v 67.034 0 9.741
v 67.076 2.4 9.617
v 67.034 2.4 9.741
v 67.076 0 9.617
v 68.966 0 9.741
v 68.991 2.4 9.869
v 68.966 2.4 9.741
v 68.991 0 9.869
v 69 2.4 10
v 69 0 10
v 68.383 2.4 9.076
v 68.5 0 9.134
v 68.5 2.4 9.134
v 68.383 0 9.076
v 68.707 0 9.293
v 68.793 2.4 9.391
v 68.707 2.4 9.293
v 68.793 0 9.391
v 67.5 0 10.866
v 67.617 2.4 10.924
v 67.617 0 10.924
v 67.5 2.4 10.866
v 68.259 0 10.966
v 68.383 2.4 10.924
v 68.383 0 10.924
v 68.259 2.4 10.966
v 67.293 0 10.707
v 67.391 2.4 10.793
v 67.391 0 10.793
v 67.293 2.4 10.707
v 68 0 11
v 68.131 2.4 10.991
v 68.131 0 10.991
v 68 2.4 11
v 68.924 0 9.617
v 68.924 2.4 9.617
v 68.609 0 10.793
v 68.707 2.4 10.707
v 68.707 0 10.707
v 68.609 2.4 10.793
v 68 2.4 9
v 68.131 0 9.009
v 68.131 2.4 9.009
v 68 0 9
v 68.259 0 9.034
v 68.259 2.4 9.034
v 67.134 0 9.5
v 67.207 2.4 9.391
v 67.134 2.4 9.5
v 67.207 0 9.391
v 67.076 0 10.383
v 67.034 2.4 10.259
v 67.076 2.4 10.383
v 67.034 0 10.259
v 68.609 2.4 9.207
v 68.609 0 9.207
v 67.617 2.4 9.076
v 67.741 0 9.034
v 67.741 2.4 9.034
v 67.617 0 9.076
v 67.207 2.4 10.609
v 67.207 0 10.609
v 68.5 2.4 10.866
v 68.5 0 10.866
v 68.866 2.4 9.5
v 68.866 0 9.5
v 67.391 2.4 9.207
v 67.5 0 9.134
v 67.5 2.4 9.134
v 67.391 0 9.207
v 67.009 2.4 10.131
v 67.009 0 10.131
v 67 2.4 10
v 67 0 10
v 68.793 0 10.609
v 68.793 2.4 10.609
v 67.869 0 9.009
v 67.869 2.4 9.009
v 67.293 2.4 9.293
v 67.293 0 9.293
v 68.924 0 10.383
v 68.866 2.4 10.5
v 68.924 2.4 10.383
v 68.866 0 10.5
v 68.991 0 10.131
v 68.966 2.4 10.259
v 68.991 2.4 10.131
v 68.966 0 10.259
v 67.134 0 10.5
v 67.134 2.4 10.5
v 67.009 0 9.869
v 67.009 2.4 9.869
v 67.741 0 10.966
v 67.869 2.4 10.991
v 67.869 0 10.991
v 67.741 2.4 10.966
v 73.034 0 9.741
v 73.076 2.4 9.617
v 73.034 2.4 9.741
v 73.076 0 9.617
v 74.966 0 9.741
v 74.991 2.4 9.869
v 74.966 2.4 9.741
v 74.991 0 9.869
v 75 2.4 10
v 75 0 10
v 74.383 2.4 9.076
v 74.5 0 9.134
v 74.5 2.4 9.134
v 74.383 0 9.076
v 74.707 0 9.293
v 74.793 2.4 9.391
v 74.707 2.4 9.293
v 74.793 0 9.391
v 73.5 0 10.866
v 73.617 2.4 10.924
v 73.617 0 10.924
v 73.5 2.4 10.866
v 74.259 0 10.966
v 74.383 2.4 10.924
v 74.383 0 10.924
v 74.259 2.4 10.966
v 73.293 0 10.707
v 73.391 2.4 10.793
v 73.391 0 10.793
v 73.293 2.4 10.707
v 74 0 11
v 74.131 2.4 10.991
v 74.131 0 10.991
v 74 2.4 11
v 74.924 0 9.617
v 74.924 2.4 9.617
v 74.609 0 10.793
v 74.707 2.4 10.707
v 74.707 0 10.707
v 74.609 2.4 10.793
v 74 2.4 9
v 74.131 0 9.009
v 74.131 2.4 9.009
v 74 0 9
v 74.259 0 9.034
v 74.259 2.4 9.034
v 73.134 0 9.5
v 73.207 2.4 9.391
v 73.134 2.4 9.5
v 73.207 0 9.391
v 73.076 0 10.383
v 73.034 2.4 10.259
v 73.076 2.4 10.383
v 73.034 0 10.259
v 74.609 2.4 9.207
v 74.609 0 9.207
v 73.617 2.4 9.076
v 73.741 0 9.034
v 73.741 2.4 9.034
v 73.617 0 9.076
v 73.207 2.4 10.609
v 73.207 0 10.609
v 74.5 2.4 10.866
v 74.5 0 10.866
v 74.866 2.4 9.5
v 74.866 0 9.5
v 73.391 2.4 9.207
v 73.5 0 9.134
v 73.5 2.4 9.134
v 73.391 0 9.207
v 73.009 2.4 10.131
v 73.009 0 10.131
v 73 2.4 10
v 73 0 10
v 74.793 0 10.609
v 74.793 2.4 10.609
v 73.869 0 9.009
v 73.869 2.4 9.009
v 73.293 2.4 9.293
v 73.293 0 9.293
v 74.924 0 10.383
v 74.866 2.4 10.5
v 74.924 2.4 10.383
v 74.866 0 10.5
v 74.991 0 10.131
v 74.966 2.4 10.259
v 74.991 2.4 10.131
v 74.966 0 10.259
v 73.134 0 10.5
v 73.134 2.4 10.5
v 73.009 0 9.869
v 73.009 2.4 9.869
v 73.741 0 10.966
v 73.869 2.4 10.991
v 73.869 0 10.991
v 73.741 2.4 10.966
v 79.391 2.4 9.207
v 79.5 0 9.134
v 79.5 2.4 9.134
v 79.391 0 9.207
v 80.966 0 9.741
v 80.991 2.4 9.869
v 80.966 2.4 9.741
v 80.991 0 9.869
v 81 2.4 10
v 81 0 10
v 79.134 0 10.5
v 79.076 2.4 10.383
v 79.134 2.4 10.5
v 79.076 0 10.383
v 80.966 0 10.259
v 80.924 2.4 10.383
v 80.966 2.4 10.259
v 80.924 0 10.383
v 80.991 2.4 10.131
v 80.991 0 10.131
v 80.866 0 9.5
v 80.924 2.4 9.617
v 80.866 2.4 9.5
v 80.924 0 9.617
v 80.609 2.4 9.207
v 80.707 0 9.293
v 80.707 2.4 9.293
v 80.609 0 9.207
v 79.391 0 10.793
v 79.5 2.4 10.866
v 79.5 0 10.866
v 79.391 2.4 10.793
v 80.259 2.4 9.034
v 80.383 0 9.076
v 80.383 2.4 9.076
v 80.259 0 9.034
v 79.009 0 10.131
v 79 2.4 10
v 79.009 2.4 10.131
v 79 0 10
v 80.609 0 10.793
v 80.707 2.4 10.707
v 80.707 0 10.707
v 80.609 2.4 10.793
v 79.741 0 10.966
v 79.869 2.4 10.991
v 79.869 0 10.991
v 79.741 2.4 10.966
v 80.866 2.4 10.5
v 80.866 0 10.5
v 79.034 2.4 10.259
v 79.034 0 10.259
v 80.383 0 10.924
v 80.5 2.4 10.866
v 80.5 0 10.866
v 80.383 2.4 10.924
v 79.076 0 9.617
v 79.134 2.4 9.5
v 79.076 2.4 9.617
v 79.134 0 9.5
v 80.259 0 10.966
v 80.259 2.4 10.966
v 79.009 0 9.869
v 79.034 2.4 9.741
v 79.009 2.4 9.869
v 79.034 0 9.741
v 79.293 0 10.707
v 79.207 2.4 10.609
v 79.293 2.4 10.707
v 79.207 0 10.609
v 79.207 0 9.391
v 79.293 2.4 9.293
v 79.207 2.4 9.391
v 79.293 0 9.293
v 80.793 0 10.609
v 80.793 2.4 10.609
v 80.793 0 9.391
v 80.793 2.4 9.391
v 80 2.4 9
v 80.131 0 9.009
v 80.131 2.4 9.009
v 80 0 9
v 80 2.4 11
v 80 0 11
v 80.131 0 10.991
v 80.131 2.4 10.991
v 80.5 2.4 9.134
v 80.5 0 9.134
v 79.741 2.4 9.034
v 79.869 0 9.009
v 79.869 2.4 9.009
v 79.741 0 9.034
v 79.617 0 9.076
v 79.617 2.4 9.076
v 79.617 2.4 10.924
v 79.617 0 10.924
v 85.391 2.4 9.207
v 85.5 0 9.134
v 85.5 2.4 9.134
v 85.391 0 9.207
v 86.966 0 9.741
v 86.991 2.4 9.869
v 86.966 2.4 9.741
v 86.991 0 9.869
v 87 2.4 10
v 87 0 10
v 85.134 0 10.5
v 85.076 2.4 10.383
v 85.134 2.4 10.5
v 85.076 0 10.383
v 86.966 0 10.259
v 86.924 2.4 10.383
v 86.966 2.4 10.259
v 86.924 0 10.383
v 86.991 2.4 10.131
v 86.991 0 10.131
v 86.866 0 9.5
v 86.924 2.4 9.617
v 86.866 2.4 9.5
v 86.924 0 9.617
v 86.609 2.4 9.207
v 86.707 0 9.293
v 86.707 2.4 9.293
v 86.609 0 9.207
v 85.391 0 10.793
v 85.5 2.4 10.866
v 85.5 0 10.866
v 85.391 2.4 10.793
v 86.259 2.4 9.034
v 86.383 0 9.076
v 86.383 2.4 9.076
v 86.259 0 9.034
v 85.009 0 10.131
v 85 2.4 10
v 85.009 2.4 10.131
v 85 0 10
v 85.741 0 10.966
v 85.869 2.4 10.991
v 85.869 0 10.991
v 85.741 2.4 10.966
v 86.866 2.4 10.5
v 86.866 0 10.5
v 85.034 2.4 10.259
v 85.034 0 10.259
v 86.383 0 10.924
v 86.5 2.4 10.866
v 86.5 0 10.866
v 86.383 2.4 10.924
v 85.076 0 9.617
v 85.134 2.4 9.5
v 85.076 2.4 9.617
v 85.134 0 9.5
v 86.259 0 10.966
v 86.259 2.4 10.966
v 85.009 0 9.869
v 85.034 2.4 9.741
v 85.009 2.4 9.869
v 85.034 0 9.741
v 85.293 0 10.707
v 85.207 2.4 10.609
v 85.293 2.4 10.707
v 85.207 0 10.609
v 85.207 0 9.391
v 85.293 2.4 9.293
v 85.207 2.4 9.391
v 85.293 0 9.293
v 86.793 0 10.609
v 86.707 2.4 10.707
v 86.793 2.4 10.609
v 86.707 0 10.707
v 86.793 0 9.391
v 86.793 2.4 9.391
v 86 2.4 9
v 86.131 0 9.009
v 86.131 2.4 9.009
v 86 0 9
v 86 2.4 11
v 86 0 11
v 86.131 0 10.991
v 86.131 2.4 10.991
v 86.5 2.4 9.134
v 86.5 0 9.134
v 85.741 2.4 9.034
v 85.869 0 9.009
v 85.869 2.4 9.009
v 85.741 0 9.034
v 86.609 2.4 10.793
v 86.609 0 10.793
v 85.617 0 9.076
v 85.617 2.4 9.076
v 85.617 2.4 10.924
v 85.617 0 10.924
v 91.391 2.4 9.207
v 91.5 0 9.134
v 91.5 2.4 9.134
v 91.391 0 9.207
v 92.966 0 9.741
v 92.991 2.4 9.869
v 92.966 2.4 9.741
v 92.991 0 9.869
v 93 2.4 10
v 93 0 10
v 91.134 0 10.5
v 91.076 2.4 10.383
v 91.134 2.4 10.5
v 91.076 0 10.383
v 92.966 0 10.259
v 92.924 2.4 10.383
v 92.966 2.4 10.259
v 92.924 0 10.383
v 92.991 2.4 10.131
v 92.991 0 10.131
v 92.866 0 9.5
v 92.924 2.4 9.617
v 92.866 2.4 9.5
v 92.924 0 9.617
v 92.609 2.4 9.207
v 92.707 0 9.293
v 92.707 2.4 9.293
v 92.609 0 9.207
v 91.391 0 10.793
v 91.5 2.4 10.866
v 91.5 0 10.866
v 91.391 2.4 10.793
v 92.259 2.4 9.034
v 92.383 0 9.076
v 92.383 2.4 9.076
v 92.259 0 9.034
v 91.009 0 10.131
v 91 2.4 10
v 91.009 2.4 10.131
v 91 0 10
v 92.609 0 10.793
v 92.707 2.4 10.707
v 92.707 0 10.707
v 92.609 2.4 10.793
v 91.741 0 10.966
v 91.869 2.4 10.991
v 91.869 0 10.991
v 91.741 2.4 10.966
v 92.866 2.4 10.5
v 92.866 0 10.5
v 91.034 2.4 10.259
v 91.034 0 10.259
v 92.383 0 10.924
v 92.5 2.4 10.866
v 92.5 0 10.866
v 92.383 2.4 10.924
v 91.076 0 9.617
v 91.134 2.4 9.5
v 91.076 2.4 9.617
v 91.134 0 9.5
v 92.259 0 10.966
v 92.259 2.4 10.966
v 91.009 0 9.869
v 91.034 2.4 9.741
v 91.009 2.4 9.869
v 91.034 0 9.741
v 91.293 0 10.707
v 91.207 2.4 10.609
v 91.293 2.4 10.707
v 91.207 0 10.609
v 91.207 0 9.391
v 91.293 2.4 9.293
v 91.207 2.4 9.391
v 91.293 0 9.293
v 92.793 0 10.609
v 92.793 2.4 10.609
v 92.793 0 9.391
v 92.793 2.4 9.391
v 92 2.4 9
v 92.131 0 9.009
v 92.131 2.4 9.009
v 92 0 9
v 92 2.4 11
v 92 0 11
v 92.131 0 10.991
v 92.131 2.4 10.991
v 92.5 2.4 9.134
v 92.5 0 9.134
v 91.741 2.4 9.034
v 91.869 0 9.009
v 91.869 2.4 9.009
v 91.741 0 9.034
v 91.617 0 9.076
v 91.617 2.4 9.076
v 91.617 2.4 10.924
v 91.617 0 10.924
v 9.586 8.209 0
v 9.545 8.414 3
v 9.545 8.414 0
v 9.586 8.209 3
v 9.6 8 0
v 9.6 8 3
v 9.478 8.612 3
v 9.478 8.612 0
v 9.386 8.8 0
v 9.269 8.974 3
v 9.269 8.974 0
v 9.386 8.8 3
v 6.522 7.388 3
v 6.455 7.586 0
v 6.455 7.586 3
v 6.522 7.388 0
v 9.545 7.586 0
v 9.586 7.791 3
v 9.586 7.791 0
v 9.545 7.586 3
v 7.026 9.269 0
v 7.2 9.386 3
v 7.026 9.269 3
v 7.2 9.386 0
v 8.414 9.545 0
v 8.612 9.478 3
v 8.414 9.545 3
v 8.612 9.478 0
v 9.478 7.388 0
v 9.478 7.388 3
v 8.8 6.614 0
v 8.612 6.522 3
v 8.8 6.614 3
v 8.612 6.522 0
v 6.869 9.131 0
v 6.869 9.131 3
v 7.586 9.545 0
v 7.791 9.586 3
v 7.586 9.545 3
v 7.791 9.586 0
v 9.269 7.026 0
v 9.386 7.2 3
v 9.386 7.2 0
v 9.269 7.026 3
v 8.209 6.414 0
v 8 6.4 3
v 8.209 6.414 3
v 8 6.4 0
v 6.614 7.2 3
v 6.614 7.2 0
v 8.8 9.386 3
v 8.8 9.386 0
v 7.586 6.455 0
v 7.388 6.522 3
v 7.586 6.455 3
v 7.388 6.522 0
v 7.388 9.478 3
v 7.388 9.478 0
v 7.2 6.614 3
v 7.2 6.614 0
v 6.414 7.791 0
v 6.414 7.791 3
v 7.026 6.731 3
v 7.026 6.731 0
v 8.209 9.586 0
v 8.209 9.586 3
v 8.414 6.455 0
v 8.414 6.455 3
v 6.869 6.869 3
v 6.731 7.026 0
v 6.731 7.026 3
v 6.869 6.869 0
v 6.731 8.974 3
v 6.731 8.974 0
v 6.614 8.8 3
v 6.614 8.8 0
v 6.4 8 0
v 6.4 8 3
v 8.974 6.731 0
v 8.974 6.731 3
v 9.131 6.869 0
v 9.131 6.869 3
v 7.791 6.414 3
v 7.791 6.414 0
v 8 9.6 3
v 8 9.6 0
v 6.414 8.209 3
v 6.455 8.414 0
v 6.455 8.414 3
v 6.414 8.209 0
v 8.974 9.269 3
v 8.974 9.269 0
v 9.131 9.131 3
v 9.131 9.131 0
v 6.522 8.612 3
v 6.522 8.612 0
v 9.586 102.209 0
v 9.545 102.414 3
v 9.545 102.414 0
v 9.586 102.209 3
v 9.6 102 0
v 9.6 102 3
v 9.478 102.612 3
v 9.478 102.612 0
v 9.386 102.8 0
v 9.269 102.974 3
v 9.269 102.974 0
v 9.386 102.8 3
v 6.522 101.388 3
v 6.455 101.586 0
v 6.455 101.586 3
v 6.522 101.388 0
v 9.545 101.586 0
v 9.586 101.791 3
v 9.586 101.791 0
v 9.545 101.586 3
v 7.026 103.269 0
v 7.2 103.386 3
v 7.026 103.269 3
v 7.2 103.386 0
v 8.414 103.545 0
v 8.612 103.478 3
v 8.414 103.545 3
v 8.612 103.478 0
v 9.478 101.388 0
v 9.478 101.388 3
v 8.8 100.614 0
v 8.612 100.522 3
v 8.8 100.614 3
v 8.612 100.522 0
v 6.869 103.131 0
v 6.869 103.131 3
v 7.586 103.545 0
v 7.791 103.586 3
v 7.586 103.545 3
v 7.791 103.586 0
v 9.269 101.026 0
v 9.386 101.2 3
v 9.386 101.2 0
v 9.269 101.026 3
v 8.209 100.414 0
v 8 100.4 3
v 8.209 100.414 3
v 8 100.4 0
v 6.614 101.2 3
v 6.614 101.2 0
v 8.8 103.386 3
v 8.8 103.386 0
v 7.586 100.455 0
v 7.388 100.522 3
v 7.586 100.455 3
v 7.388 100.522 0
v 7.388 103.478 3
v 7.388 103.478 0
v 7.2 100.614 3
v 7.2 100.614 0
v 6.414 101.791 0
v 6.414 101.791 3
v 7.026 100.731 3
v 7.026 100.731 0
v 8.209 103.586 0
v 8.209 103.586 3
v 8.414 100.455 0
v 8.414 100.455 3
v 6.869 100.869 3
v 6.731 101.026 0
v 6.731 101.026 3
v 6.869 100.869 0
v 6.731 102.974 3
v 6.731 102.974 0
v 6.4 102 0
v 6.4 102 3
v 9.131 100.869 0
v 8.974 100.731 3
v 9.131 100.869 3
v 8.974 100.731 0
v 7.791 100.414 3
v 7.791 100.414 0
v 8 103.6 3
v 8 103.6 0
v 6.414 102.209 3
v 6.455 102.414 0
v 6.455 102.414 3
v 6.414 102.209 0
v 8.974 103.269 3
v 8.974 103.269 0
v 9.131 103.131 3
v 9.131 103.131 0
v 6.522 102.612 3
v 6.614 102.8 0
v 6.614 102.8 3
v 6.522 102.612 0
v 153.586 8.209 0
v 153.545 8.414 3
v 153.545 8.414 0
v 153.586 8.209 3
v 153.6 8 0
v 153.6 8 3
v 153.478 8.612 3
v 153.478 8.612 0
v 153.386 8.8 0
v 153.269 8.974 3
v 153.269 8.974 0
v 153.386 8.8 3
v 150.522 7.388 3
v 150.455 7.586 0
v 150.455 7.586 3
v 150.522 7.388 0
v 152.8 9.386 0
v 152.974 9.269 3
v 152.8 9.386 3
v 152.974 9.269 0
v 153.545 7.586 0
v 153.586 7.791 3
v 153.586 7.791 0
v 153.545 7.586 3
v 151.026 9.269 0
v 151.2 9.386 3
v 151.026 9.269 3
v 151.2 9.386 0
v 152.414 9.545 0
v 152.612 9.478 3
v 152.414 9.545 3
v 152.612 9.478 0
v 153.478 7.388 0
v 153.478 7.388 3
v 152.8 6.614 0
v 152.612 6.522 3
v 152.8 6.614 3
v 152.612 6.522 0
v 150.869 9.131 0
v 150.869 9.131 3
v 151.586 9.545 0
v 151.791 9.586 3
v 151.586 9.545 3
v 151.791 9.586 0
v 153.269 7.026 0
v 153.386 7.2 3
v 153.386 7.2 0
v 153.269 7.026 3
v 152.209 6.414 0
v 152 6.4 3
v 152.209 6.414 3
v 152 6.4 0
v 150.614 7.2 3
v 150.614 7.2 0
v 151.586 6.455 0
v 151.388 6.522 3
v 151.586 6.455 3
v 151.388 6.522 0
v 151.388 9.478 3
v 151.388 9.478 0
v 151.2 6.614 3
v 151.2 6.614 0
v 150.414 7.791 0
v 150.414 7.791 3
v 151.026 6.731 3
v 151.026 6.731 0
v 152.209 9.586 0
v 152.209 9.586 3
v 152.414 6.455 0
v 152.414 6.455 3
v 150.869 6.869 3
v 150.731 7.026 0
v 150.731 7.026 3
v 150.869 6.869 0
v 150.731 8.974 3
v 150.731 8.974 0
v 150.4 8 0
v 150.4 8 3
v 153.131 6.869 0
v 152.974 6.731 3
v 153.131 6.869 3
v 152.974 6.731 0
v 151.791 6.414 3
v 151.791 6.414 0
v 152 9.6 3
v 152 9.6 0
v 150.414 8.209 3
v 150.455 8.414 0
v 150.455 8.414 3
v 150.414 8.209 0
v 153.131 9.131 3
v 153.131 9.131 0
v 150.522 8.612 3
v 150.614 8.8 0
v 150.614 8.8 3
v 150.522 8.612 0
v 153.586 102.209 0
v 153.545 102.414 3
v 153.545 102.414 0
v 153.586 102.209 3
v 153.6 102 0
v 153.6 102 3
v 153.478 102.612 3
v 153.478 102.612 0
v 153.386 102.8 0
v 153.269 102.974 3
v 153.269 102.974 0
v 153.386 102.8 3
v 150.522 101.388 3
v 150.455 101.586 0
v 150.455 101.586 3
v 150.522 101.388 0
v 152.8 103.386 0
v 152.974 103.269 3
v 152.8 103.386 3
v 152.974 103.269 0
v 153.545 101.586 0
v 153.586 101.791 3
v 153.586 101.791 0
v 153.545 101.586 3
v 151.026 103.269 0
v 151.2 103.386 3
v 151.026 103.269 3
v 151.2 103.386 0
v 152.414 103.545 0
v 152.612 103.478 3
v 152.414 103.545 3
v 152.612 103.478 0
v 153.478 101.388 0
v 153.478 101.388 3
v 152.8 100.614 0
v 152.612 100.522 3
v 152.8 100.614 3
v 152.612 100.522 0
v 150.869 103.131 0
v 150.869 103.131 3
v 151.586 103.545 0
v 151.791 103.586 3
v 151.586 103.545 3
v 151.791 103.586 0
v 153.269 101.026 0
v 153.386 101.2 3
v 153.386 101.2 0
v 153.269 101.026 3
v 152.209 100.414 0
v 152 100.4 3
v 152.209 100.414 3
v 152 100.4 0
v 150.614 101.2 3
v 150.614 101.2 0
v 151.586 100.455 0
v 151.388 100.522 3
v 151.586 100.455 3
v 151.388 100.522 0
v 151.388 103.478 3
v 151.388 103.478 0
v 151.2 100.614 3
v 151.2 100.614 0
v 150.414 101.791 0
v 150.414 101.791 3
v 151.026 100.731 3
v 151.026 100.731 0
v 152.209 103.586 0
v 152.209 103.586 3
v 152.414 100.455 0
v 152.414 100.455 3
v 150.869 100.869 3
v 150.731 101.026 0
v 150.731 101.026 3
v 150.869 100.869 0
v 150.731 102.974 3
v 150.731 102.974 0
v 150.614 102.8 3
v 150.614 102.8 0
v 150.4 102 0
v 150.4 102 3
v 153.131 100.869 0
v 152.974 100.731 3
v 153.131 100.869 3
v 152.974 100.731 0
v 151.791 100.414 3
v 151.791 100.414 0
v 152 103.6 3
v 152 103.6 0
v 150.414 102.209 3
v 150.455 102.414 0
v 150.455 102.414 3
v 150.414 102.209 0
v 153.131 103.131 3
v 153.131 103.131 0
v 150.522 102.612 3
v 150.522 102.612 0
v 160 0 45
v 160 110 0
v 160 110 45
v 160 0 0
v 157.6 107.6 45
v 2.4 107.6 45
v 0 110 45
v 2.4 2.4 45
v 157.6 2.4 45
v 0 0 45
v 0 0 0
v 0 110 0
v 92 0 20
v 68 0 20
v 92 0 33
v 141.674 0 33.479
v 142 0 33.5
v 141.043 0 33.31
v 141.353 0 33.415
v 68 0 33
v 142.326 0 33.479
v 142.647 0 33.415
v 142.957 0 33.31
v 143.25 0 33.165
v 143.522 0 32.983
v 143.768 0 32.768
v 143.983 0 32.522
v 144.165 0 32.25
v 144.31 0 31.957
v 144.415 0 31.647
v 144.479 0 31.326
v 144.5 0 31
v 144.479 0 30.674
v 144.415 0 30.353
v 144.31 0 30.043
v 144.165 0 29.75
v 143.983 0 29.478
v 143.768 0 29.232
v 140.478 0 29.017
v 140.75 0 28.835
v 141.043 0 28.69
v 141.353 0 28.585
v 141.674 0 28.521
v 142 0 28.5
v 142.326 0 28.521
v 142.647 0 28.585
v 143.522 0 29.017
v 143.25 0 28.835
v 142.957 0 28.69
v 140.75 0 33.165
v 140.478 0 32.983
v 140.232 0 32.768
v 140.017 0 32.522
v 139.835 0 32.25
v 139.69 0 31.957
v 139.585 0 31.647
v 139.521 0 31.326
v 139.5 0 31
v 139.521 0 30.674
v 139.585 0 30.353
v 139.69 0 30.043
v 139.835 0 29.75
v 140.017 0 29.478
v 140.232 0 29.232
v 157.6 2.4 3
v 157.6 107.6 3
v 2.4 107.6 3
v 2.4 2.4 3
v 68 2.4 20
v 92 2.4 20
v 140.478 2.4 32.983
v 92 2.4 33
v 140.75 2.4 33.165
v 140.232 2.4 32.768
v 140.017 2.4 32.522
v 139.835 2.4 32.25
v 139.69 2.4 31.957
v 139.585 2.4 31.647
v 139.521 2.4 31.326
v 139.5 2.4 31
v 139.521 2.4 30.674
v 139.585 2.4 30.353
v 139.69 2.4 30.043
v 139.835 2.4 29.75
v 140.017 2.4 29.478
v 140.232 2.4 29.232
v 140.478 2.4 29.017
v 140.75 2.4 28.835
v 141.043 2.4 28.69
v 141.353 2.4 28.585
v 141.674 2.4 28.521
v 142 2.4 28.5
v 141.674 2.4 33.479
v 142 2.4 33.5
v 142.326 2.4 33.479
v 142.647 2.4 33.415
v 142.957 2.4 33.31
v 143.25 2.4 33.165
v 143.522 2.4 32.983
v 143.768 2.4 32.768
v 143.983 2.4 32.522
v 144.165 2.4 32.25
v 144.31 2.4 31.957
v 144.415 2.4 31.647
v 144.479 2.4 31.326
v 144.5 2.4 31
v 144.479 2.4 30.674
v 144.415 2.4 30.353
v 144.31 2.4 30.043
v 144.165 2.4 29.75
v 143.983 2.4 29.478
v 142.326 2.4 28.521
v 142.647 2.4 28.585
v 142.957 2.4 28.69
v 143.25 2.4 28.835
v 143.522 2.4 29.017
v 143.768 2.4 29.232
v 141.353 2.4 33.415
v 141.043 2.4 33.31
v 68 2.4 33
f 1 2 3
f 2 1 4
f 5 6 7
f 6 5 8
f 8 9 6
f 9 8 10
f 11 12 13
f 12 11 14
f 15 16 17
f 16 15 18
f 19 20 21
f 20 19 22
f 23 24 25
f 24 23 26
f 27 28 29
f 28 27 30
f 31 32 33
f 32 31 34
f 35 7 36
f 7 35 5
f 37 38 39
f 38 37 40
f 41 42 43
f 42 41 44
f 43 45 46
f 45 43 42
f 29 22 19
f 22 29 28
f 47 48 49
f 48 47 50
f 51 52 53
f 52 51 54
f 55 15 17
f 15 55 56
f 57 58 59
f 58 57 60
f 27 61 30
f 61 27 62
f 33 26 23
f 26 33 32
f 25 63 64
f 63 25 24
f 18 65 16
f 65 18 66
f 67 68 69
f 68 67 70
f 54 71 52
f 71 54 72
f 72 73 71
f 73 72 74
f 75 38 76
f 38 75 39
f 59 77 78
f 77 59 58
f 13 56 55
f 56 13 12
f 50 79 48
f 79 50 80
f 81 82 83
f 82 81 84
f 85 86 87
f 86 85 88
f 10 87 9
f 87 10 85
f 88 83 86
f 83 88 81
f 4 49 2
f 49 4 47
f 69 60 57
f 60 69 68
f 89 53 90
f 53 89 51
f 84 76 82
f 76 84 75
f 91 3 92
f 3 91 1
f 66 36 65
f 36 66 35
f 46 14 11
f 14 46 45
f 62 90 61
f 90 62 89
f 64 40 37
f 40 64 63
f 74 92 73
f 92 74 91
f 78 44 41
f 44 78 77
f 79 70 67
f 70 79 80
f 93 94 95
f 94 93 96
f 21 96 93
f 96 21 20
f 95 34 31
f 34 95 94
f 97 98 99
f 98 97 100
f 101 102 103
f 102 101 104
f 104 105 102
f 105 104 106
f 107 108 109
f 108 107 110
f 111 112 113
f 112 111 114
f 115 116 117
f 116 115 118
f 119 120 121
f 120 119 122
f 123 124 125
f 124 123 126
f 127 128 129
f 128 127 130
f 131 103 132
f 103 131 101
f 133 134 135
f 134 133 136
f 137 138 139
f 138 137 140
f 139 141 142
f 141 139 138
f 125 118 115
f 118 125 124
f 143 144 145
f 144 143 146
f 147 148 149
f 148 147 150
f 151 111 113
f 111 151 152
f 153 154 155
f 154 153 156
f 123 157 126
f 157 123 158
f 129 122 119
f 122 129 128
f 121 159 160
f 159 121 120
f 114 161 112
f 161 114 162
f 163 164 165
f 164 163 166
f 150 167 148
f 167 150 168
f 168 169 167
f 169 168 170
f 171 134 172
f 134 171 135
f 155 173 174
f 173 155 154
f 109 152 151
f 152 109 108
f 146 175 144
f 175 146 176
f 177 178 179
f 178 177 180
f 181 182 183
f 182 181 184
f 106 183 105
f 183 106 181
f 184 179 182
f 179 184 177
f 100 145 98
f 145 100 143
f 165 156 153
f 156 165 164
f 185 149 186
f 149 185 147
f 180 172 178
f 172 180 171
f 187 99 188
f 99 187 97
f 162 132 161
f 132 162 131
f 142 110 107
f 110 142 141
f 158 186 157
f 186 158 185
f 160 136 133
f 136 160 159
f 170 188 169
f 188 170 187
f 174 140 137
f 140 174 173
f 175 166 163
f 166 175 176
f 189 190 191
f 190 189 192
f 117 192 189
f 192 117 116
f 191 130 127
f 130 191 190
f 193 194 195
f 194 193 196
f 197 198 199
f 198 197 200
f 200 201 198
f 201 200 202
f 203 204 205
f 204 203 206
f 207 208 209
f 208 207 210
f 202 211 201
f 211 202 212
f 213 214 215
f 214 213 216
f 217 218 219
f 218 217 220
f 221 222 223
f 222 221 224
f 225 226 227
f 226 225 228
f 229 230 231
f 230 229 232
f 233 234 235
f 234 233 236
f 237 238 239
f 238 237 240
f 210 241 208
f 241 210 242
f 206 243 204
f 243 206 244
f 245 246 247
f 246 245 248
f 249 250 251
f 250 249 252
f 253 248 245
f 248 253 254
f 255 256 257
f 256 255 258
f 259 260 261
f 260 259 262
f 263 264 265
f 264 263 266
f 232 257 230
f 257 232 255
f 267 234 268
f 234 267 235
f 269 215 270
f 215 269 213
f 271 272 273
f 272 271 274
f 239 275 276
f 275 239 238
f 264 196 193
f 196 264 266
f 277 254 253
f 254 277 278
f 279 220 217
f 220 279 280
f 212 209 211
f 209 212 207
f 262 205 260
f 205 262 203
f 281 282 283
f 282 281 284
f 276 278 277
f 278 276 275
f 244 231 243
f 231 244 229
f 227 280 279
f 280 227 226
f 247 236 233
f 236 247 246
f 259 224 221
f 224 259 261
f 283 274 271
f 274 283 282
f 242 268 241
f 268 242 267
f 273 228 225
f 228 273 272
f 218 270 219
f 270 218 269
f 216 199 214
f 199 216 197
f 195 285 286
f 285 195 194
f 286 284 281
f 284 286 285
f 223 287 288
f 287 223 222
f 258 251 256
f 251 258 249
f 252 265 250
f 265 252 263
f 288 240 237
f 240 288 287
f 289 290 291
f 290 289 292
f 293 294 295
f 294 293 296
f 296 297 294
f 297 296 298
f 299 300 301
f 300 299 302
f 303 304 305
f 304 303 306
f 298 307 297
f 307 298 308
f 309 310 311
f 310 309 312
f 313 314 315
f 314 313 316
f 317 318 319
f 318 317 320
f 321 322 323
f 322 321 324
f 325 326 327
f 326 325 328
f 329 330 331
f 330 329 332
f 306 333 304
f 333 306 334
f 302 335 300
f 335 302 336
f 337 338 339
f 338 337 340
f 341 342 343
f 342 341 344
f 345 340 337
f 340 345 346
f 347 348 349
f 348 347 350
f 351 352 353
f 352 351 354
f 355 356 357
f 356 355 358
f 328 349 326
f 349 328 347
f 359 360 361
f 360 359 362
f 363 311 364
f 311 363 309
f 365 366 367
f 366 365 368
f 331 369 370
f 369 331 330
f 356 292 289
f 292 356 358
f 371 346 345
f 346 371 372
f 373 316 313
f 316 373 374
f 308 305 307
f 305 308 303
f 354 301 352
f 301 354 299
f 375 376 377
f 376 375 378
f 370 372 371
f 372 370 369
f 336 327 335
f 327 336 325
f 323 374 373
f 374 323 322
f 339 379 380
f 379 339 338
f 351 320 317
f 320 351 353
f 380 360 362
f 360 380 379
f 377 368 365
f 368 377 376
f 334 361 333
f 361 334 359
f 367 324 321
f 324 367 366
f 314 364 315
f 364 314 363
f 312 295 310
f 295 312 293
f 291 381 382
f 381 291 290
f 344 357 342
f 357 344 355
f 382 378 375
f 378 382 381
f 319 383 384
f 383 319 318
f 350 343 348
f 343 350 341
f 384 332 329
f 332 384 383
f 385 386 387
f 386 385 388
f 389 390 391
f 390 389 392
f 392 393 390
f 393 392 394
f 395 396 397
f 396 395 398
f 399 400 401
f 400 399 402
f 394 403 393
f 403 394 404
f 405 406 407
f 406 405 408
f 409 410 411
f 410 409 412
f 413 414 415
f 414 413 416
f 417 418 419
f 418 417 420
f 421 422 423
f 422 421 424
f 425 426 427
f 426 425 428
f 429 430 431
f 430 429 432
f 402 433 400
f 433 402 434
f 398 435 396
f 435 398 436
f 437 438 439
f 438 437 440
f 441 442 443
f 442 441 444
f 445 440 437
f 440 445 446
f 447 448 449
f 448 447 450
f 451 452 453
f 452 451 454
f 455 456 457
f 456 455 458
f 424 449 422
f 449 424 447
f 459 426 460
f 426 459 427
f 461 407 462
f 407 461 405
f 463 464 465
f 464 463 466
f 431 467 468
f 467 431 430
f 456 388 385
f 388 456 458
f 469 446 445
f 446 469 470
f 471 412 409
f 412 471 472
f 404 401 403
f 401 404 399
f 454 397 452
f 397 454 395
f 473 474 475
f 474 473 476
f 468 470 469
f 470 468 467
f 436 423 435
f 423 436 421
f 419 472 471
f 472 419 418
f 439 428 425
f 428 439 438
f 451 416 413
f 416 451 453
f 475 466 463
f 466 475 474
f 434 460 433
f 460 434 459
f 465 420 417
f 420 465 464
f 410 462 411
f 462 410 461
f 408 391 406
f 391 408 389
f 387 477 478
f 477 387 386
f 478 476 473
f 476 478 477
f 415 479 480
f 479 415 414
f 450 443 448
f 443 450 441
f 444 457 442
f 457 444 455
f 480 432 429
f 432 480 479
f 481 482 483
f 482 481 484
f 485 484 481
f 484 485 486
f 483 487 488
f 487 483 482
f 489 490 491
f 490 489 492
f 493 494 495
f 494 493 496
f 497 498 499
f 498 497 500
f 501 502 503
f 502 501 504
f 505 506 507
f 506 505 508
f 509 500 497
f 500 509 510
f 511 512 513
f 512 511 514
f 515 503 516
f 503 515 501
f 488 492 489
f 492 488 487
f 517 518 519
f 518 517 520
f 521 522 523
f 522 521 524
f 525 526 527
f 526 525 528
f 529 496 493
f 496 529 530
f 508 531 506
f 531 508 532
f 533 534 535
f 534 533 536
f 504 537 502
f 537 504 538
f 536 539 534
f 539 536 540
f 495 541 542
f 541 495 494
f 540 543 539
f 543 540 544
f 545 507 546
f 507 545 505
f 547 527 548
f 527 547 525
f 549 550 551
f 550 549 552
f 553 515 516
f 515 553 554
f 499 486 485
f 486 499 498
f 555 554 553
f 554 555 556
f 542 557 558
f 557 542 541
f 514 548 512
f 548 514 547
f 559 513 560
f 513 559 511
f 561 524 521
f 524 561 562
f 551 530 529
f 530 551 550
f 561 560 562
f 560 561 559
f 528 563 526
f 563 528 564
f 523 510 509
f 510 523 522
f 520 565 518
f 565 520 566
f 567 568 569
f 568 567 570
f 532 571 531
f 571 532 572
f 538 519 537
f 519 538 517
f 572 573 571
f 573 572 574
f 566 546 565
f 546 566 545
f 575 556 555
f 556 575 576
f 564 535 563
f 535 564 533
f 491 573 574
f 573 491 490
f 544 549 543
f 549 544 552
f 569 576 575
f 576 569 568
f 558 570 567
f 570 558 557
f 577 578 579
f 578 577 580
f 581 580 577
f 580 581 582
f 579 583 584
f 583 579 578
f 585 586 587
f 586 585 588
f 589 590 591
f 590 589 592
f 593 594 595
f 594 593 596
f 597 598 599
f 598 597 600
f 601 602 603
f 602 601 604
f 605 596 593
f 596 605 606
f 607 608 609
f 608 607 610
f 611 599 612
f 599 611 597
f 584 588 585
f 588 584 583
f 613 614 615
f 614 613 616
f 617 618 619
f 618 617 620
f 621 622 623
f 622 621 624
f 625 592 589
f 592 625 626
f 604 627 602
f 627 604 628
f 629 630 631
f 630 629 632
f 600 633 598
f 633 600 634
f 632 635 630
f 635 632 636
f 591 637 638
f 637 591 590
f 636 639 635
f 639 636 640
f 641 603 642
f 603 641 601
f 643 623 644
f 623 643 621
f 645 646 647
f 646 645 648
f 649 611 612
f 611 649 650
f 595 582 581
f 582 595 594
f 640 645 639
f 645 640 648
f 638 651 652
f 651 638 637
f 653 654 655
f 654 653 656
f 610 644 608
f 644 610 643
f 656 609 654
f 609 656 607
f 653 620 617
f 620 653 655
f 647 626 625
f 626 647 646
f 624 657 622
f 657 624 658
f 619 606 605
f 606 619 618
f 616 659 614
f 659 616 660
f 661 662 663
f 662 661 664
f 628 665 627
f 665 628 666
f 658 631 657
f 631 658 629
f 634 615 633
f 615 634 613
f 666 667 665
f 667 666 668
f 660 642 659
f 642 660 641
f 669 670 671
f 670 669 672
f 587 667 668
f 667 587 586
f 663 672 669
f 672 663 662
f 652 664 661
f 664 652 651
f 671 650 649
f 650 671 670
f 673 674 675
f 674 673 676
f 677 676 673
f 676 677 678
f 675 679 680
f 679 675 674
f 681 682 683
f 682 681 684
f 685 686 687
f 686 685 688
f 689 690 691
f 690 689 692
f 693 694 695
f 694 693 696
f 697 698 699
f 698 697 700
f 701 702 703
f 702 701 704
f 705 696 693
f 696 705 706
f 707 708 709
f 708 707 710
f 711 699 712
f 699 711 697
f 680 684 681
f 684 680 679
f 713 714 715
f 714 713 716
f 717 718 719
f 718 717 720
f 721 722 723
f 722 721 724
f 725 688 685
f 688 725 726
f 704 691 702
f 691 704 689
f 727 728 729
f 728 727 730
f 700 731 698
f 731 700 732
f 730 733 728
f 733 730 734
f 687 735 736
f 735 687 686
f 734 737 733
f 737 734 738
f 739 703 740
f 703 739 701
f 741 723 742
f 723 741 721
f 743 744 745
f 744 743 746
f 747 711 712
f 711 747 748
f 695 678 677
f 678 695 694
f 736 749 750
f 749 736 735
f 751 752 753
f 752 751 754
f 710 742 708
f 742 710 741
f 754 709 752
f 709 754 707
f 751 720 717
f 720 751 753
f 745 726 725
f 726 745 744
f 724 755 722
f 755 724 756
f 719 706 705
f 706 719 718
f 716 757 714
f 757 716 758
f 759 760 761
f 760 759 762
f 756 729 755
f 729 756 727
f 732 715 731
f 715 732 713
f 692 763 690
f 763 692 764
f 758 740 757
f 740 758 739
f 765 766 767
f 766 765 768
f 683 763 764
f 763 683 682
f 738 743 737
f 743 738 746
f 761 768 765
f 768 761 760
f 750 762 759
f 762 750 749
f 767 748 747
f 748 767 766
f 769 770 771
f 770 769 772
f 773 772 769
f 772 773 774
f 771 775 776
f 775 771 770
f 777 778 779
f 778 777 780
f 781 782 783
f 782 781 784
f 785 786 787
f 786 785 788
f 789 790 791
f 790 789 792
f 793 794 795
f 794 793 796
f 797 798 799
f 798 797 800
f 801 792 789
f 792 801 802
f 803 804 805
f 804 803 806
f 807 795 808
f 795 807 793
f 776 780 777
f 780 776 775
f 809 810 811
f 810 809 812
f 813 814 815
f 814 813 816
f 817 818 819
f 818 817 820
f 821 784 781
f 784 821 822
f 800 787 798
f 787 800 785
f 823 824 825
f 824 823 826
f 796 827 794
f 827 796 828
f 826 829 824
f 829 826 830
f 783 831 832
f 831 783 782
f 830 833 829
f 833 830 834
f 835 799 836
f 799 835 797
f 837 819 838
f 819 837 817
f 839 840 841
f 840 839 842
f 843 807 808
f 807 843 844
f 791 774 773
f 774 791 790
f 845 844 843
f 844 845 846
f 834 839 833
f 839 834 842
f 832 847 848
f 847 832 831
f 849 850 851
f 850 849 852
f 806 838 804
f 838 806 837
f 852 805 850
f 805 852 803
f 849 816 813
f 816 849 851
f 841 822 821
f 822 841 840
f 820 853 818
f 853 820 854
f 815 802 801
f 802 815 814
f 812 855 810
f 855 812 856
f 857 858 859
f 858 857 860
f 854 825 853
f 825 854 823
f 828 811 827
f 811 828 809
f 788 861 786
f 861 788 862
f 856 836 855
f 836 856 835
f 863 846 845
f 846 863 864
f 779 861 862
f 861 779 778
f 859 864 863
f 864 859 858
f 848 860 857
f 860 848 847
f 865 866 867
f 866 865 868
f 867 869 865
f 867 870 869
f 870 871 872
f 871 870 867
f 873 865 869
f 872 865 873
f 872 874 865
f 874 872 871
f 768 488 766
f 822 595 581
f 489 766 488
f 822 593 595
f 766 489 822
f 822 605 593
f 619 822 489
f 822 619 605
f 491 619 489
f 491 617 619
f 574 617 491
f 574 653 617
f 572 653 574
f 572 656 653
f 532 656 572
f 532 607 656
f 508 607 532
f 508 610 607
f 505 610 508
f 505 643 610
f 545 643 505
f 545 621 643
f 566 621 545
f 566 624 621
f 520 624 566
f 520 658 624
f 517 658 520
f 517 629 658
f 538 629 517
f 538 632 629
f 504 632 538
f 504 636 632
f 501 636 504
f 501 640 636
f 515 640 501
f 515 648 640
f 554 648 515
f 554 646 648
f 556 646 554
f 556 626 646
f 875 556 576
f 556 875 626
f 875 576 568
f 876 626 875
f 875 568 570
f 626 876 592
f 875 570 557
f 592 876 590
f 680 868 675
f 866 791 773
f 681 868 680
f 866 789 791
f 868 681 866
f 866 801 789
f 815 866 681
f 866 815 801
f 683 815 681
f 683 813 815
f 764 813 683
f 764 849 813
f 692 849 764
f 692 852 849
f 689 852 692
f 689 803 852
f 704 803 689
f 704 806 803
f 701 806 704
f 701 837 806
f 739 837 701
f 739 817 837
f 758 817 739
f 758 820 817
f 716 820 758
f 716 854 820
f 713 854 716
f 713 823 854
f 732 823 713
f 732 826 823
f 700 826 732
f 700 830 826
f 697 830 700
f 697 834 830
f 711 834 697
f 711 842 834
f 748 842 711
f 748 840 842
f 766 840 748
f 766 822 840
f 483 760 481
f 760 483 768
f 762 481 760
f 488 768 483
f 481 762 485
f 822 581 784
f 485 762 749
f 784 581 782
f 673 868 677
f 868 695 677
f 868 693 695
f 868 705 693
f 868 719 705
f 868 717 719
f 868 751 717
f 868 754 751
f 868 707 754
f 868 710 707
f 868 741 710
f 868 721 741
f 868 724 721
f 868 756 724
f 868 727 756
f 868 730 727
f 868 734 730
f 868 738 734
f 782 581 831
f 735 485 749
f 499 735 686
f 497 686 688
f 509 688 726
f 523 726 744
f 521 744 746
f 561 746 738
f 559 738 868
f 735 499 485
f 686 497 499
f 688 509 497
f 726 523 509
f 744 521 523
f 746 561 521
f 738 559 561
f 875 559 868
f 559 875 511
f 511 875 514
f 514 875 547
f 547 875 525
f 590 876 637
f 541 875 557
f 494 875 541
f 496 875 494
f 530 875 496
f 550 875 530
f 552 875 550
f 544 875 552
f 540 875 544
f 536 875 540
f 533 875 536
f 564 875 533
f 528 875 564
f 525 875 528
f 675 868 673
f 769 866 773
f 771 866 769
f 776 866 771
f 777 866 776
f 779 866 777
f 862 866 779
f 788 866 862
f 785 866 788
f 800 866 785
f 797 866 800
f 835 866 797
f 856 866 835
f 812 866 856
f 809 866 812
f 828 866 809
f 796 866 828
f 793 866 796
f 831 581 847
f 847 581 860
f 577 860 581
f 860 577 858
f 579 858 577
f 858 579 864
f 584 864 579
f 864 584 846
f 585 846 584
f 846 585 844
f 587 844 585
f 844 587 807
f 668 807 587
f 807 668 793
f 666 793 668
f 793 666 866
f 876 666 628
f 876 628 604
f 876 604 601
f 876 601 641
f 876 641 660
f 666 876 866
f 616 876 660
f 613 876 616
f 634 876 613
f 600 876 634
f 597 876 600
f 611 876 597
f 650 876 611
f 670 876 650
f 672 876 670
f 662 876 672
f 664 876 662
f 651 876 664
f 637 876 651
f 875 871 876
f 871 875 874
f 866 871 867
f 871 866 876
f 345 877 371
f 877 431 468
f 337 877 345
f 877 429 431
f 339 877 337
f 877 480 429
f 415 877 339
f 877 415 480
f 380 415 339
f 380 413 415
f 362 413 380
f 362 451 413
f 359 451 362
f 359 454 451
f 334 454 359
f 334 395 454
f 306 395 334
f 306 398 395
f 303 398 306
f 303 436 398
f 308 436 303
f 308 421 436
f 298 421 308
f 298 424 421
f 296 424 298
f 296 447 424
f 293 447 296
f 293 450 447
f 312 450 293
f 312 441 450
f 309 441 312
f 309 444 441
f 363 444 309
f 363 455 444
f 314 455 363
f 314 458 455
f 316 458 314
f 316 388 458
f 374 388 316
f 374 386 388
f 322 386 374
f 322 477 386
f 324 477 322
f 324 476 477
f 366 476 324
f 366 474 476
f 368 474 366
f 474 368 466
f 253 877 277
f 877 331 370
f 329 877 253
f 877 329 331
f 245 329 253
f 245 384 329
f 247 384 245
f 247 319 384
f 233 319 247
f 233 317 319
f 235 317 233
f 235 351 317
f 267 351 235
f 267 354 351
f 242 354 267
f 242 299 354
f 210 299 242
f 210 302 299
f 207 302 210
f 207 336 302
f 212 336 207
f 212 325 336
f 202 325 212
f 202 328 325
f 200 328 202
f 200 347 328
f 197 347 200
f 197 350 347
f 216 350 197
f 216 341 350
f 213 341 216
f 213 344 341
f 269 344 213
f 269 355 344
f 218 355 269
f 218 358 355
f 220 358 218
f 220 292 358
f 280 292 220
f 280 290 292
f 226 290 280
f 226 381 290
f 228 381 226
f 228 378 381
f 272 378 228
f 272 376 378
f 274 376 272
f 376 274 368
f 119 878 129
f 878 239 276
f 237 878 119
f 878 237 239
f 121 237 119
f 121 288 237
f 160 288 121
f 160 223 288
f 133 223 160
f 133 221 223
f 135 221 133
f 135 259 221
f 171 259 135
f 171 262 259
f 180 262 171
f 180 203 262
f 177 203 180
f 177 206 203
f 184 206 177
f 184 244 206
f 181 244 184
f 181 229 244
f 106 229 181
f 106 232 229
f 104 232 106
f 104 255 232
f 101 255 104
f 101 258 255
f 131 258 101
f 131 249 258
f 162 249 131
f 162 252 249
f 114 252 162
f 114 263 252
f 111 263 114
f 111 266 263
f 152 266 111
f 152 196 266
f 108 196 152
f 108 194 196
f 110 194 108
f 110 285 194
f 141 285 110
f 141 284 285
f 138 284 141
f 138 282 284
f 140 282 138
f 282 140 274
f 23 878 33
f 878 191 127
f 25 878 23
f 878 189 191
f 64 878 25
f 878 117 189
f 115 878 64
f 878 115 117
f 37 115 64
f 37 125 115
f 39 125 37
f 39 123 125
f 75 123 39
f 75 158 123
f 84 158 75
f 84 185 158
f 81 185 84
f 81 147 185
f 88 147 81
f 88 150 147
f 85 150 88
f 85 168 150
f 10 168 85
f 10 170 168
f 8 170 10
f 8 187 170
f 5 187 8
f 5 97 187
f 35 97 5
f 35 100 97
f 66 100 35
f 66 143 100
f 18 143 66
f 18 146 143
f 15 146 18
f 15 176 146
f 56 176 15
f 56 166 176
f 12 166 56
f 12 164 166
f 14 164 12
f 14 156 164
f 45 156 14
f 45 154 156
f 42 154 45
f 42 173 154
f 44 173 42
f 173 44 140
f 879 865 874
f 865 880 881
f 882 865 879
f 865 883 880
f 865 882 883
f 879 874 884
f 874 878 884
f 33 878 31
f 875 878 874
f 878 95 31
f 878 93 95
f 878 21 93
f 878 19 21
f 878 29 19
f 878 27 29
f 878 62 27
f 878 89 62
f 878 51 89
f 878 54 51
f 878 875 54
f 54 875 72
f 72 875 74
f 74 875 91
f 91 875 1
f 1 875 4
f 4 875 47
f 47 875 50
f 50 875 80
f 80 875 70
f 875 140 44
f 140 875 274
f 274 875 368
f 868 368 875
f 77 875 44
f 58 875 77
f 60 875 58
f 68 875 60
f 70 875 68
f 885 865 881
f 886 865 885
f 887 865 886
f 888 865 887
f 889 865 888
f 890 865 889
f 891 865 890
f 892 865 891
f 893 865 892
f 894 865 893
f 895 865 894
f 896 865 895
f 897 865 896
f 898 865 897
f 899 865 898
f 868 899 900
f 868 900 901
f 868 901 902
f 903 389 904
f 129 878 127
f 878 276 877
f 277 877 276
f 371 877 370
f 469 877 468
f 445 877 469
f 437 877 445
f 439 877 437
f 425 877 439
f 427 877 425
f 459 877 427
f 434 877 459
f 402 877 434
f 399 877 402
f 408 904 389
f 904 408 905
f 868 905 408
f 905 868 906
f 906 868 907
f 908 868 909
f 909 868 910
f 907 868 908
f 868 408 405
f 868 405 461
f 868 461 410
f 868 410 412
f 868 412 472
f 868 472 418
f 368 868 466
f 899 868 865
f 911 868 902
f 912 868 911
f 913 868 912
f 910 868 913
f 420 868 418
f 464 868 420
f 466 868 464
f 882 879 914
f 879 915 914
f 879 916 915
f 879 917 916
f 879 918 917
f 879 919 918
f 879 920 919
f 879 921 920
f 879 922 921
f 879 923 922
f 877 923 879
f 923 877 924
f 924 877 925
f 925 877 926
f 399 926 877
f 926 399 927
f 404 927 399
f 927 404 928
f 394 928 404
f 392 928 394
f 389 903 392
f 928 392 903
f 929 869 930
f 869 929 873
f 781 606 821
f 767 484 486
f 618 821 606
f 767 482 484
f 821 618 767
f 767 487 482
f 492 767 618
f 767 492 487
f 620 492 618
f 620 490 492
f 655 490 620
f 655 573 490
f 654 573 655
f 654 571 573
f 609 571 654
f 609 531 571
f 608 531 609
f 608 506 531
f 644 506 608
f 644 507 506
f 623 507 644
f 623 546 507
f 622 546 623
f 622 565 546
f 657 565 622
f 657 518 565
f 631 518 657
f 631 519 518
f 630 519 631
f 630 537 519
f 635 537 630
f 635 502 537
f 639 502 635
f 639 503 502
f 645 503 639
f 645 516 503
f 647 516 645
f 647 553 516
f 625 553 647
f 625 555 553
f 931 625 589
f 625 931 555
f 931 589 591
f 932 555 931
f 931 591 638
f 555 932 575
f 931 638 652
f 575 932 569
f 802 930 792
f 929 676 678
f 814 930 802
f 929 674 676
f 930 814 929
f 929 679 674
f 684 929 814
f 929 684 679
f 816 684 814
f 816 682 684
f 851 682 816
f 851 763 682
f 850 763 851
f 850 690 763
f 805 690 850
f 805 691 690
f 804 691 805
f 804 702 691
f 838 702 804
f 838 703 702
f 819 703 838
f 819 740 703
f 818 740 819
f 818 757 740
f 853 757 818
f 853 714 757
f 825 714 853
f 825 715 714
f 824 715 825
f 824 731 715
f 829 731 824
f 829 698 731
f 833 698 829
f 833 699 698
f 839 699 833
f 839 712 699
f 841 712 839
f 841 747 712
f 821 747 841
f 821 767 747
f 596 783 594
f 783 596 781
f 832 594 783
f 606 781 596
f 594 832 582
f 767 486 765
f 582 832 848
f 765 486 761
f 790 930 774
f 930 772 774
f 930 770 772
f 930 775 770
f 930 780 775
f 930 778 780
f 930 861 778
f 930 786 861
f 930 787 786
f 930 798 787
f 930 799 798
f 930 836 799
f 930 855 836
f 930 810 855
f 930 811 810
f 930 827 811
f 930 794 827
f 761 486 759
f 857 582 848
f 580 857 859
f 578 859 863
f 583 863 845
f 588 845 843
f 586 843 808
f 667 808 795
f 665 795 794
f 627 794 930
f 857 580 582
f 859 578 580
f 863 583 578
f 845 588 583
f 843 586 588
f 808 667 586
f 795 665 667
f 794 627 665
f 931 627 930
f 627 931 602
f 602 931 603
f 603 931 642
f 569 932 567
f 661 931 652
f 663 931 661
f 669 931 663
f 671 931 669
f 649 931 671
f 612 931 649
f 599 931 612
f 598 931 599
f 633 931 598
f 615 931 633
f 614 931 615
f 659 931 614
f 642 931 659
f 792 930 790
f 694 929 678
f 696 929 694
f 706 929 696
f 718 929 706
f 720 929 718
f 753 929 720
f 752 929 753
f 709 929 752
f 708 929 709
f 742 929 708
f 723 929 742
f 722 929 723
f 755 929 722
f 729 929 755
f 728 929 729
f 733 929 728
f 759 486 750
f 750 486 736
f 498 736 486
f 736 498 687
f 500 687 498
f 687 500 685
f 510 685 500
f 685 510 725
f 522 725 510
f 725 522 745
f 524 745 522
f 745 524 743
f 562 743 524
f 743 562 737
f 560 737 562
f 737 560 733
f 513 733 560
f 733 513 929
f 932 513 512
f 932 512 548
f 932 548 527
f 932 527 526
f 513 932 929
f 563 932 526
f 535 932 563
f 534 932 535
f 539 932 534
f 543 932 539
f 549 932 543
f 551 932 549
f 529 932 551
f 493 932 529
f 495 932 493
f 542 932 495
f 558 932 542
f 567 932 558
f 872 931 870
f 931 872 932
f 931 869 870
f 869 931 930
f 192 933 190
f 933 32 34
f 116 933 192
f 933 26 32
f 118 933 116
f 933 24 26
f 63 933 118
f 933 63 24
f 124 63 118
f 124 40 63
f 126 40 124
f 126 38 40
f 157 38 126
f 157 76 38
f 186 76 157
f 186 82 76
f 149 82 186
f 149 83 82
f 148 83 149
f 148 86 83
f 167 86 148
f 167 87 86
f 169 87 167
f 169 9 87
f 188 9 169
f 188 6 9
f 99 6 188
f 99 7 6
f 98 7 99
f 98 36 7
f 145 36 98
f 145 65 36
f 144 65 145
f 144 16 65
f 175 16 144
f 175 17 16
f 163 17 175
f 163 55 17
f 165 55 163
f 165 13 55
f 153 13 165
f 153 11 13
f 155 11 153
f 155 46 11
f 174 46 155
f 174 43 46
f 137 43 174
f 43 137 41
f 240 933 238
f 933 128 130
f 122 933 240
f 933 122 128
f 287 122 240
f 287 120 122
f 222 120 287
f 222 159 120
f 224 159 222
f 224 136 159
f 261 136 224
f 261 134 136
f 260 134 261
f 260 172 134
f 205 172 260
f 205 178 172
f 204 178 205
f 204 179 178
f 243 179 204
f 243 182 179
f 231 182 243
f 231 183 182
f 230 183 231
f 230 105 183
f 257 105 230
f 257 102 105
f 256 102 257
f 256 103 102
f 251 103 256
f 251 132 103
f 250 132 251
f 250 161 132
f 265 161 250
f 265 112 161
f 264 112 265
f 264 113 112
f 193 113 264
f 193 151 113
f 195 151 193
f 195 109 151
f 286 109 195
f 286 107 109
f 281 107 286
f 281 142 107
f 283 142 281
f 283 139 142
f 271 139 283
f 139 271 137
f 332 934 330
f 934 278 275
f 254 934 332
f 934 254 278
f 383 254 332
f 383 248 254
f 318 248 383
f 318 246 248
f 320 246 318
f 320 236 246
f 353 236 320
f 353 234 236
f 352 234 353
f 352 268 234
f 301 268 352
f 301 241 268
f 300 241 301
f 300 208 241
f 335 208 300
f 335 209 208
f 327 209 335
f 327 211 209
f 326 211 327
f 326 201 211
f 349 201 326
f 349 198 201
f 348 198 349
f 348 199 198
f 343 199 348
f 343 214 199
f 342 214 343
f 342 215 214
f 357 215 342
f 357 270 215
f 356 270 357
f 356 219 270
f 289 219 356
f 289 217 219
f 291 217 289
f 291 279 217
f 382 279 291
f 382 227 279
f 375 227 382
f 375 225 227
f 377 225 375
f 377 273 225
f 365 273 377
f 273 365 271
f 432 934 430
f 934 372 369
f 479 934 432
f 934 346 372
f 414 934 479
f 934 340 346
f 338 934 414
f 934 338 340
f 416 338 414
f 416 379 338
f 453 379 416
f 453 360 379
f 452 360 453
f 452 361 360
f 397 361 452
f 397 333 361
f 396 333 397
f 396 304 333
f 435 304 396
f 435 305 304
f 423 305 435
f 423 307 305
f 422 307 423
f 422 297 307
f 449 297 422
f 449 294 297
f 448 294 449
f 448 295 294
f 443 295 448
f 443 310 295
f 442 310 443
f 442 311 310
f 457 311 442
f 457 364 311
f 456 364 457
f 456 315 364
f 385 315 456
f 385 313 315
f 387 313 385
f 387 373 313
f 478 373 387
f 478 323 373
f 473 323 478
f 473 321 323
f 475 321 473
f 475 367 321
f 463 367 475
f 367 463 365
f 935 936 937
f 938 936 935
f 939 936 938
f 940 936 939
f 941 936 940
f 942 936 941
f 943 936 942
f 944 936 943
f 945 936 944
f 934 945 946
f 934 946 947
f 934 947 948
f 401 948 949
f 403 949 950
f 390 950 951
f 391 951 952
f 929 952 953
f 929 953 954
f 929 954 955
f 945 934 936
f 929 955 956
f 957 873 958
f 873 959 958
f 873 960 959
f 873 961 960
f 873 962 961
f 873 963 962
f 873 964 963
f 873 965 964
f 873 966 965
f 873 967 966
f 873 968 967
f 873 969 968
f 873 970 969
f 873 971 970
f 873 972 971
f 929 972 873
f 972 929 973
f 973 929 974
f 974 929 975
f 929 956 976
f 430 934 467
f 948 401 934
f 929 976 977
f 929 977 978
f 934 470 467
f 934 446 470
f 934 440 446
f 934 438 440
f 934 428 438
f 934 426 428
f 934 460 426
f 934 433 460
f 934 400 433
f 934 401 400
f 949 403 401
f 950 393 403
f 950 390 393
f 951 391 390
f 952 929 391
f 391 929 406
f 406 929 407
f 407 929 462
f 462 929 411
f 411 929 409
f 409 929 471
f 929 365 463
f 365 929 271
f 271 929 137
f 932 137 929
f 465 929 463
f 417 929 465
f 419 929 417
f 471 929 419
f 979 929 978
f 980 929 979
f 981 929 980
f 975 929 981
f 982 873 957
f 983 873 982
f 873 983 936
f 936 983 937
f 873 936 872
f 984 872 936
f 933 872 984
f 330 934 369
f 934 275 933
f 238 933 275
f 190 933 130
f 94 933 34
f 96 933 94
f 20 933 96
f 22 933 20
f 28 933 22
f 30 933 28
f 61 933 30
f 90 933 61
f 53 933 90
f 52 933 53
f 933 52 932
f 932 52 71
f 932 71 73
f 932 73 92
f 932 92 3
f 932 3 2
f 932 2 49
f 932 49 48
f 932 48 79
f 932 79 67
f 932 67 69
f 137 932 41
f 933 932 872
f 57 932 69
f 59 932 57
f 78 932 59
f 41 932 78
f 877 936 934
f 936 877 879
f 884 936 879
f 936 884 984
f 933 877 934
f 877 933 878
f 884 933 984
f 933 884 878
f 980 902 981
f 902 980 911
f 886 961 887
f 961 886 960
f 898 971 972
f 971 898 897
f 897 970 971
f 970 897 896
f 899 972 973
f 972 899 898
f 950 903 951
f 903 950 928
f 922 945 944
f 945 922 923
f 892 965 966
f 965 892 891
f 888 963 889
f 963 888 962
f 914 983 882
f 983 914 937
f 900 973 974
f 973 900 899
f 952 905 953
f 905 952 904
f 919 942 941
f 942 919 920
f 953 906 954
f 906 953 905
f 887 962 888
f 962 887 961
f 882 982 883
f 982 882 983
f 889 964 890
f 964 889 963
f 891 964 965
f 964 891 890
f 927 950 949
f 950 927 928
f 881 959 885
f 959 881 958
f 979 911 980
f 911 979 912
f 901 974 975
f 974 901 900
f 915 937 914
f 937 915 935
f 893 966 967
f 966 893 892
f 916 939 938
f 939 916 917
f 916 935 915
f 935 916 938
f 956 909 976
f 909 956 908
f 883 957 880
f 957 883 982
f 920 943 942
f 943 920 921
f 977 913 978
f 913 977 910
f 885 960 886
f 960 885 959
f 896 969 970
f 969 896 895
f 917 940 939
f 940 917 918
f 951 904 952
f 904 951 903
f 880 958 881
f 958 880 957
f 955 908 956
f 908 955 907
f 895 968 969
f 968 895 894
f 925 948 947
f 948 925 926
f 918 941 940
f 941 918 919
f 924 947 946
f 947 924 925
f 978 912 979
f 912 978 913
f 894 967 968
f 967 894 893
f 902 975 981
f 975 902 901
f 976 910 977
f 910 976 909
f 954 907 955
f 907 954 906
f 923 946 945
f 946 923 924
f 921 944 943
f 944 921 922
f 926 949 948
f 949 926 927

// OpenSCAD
// Smart Kitchen LPG Safety System
// Enclosure base
// Units: mm

$fn = 48;

length = 160;
width = 110;
height = 45;
wall = 2.4;
floor = 3;
hole_d = 3.2;
offset = 8;

difference() {
cube([length, width, height]);

translate([wall, wall, floor])
    cube([
        length - 2*wall,
        width - 2*wall,
        height
    ]);

// OLED opening on front side
translate([68, -0.1, 20])
    cube([24, wall + 0.2, 13]);

// Buzzer holes
for (x = [68, 74, 80, 86, 92])
    translate([x, -0.1, 10])
        rotate([-90, 0, 0])
            cylinder(h = wall + 0.2, d = 2);

// LED hole
translate([142, -0.1, 31])
    rotate([-90, 0, 0])
        cylinder(h = wall + 0.2, d = 5);

// Base mounting holes
for (x = [offset, length-offset])
    for (y = [offset, width-offset])
        translate([x, y, -0.1])
            cylinder(h = floor + 0.2, d = hole_d);

}
